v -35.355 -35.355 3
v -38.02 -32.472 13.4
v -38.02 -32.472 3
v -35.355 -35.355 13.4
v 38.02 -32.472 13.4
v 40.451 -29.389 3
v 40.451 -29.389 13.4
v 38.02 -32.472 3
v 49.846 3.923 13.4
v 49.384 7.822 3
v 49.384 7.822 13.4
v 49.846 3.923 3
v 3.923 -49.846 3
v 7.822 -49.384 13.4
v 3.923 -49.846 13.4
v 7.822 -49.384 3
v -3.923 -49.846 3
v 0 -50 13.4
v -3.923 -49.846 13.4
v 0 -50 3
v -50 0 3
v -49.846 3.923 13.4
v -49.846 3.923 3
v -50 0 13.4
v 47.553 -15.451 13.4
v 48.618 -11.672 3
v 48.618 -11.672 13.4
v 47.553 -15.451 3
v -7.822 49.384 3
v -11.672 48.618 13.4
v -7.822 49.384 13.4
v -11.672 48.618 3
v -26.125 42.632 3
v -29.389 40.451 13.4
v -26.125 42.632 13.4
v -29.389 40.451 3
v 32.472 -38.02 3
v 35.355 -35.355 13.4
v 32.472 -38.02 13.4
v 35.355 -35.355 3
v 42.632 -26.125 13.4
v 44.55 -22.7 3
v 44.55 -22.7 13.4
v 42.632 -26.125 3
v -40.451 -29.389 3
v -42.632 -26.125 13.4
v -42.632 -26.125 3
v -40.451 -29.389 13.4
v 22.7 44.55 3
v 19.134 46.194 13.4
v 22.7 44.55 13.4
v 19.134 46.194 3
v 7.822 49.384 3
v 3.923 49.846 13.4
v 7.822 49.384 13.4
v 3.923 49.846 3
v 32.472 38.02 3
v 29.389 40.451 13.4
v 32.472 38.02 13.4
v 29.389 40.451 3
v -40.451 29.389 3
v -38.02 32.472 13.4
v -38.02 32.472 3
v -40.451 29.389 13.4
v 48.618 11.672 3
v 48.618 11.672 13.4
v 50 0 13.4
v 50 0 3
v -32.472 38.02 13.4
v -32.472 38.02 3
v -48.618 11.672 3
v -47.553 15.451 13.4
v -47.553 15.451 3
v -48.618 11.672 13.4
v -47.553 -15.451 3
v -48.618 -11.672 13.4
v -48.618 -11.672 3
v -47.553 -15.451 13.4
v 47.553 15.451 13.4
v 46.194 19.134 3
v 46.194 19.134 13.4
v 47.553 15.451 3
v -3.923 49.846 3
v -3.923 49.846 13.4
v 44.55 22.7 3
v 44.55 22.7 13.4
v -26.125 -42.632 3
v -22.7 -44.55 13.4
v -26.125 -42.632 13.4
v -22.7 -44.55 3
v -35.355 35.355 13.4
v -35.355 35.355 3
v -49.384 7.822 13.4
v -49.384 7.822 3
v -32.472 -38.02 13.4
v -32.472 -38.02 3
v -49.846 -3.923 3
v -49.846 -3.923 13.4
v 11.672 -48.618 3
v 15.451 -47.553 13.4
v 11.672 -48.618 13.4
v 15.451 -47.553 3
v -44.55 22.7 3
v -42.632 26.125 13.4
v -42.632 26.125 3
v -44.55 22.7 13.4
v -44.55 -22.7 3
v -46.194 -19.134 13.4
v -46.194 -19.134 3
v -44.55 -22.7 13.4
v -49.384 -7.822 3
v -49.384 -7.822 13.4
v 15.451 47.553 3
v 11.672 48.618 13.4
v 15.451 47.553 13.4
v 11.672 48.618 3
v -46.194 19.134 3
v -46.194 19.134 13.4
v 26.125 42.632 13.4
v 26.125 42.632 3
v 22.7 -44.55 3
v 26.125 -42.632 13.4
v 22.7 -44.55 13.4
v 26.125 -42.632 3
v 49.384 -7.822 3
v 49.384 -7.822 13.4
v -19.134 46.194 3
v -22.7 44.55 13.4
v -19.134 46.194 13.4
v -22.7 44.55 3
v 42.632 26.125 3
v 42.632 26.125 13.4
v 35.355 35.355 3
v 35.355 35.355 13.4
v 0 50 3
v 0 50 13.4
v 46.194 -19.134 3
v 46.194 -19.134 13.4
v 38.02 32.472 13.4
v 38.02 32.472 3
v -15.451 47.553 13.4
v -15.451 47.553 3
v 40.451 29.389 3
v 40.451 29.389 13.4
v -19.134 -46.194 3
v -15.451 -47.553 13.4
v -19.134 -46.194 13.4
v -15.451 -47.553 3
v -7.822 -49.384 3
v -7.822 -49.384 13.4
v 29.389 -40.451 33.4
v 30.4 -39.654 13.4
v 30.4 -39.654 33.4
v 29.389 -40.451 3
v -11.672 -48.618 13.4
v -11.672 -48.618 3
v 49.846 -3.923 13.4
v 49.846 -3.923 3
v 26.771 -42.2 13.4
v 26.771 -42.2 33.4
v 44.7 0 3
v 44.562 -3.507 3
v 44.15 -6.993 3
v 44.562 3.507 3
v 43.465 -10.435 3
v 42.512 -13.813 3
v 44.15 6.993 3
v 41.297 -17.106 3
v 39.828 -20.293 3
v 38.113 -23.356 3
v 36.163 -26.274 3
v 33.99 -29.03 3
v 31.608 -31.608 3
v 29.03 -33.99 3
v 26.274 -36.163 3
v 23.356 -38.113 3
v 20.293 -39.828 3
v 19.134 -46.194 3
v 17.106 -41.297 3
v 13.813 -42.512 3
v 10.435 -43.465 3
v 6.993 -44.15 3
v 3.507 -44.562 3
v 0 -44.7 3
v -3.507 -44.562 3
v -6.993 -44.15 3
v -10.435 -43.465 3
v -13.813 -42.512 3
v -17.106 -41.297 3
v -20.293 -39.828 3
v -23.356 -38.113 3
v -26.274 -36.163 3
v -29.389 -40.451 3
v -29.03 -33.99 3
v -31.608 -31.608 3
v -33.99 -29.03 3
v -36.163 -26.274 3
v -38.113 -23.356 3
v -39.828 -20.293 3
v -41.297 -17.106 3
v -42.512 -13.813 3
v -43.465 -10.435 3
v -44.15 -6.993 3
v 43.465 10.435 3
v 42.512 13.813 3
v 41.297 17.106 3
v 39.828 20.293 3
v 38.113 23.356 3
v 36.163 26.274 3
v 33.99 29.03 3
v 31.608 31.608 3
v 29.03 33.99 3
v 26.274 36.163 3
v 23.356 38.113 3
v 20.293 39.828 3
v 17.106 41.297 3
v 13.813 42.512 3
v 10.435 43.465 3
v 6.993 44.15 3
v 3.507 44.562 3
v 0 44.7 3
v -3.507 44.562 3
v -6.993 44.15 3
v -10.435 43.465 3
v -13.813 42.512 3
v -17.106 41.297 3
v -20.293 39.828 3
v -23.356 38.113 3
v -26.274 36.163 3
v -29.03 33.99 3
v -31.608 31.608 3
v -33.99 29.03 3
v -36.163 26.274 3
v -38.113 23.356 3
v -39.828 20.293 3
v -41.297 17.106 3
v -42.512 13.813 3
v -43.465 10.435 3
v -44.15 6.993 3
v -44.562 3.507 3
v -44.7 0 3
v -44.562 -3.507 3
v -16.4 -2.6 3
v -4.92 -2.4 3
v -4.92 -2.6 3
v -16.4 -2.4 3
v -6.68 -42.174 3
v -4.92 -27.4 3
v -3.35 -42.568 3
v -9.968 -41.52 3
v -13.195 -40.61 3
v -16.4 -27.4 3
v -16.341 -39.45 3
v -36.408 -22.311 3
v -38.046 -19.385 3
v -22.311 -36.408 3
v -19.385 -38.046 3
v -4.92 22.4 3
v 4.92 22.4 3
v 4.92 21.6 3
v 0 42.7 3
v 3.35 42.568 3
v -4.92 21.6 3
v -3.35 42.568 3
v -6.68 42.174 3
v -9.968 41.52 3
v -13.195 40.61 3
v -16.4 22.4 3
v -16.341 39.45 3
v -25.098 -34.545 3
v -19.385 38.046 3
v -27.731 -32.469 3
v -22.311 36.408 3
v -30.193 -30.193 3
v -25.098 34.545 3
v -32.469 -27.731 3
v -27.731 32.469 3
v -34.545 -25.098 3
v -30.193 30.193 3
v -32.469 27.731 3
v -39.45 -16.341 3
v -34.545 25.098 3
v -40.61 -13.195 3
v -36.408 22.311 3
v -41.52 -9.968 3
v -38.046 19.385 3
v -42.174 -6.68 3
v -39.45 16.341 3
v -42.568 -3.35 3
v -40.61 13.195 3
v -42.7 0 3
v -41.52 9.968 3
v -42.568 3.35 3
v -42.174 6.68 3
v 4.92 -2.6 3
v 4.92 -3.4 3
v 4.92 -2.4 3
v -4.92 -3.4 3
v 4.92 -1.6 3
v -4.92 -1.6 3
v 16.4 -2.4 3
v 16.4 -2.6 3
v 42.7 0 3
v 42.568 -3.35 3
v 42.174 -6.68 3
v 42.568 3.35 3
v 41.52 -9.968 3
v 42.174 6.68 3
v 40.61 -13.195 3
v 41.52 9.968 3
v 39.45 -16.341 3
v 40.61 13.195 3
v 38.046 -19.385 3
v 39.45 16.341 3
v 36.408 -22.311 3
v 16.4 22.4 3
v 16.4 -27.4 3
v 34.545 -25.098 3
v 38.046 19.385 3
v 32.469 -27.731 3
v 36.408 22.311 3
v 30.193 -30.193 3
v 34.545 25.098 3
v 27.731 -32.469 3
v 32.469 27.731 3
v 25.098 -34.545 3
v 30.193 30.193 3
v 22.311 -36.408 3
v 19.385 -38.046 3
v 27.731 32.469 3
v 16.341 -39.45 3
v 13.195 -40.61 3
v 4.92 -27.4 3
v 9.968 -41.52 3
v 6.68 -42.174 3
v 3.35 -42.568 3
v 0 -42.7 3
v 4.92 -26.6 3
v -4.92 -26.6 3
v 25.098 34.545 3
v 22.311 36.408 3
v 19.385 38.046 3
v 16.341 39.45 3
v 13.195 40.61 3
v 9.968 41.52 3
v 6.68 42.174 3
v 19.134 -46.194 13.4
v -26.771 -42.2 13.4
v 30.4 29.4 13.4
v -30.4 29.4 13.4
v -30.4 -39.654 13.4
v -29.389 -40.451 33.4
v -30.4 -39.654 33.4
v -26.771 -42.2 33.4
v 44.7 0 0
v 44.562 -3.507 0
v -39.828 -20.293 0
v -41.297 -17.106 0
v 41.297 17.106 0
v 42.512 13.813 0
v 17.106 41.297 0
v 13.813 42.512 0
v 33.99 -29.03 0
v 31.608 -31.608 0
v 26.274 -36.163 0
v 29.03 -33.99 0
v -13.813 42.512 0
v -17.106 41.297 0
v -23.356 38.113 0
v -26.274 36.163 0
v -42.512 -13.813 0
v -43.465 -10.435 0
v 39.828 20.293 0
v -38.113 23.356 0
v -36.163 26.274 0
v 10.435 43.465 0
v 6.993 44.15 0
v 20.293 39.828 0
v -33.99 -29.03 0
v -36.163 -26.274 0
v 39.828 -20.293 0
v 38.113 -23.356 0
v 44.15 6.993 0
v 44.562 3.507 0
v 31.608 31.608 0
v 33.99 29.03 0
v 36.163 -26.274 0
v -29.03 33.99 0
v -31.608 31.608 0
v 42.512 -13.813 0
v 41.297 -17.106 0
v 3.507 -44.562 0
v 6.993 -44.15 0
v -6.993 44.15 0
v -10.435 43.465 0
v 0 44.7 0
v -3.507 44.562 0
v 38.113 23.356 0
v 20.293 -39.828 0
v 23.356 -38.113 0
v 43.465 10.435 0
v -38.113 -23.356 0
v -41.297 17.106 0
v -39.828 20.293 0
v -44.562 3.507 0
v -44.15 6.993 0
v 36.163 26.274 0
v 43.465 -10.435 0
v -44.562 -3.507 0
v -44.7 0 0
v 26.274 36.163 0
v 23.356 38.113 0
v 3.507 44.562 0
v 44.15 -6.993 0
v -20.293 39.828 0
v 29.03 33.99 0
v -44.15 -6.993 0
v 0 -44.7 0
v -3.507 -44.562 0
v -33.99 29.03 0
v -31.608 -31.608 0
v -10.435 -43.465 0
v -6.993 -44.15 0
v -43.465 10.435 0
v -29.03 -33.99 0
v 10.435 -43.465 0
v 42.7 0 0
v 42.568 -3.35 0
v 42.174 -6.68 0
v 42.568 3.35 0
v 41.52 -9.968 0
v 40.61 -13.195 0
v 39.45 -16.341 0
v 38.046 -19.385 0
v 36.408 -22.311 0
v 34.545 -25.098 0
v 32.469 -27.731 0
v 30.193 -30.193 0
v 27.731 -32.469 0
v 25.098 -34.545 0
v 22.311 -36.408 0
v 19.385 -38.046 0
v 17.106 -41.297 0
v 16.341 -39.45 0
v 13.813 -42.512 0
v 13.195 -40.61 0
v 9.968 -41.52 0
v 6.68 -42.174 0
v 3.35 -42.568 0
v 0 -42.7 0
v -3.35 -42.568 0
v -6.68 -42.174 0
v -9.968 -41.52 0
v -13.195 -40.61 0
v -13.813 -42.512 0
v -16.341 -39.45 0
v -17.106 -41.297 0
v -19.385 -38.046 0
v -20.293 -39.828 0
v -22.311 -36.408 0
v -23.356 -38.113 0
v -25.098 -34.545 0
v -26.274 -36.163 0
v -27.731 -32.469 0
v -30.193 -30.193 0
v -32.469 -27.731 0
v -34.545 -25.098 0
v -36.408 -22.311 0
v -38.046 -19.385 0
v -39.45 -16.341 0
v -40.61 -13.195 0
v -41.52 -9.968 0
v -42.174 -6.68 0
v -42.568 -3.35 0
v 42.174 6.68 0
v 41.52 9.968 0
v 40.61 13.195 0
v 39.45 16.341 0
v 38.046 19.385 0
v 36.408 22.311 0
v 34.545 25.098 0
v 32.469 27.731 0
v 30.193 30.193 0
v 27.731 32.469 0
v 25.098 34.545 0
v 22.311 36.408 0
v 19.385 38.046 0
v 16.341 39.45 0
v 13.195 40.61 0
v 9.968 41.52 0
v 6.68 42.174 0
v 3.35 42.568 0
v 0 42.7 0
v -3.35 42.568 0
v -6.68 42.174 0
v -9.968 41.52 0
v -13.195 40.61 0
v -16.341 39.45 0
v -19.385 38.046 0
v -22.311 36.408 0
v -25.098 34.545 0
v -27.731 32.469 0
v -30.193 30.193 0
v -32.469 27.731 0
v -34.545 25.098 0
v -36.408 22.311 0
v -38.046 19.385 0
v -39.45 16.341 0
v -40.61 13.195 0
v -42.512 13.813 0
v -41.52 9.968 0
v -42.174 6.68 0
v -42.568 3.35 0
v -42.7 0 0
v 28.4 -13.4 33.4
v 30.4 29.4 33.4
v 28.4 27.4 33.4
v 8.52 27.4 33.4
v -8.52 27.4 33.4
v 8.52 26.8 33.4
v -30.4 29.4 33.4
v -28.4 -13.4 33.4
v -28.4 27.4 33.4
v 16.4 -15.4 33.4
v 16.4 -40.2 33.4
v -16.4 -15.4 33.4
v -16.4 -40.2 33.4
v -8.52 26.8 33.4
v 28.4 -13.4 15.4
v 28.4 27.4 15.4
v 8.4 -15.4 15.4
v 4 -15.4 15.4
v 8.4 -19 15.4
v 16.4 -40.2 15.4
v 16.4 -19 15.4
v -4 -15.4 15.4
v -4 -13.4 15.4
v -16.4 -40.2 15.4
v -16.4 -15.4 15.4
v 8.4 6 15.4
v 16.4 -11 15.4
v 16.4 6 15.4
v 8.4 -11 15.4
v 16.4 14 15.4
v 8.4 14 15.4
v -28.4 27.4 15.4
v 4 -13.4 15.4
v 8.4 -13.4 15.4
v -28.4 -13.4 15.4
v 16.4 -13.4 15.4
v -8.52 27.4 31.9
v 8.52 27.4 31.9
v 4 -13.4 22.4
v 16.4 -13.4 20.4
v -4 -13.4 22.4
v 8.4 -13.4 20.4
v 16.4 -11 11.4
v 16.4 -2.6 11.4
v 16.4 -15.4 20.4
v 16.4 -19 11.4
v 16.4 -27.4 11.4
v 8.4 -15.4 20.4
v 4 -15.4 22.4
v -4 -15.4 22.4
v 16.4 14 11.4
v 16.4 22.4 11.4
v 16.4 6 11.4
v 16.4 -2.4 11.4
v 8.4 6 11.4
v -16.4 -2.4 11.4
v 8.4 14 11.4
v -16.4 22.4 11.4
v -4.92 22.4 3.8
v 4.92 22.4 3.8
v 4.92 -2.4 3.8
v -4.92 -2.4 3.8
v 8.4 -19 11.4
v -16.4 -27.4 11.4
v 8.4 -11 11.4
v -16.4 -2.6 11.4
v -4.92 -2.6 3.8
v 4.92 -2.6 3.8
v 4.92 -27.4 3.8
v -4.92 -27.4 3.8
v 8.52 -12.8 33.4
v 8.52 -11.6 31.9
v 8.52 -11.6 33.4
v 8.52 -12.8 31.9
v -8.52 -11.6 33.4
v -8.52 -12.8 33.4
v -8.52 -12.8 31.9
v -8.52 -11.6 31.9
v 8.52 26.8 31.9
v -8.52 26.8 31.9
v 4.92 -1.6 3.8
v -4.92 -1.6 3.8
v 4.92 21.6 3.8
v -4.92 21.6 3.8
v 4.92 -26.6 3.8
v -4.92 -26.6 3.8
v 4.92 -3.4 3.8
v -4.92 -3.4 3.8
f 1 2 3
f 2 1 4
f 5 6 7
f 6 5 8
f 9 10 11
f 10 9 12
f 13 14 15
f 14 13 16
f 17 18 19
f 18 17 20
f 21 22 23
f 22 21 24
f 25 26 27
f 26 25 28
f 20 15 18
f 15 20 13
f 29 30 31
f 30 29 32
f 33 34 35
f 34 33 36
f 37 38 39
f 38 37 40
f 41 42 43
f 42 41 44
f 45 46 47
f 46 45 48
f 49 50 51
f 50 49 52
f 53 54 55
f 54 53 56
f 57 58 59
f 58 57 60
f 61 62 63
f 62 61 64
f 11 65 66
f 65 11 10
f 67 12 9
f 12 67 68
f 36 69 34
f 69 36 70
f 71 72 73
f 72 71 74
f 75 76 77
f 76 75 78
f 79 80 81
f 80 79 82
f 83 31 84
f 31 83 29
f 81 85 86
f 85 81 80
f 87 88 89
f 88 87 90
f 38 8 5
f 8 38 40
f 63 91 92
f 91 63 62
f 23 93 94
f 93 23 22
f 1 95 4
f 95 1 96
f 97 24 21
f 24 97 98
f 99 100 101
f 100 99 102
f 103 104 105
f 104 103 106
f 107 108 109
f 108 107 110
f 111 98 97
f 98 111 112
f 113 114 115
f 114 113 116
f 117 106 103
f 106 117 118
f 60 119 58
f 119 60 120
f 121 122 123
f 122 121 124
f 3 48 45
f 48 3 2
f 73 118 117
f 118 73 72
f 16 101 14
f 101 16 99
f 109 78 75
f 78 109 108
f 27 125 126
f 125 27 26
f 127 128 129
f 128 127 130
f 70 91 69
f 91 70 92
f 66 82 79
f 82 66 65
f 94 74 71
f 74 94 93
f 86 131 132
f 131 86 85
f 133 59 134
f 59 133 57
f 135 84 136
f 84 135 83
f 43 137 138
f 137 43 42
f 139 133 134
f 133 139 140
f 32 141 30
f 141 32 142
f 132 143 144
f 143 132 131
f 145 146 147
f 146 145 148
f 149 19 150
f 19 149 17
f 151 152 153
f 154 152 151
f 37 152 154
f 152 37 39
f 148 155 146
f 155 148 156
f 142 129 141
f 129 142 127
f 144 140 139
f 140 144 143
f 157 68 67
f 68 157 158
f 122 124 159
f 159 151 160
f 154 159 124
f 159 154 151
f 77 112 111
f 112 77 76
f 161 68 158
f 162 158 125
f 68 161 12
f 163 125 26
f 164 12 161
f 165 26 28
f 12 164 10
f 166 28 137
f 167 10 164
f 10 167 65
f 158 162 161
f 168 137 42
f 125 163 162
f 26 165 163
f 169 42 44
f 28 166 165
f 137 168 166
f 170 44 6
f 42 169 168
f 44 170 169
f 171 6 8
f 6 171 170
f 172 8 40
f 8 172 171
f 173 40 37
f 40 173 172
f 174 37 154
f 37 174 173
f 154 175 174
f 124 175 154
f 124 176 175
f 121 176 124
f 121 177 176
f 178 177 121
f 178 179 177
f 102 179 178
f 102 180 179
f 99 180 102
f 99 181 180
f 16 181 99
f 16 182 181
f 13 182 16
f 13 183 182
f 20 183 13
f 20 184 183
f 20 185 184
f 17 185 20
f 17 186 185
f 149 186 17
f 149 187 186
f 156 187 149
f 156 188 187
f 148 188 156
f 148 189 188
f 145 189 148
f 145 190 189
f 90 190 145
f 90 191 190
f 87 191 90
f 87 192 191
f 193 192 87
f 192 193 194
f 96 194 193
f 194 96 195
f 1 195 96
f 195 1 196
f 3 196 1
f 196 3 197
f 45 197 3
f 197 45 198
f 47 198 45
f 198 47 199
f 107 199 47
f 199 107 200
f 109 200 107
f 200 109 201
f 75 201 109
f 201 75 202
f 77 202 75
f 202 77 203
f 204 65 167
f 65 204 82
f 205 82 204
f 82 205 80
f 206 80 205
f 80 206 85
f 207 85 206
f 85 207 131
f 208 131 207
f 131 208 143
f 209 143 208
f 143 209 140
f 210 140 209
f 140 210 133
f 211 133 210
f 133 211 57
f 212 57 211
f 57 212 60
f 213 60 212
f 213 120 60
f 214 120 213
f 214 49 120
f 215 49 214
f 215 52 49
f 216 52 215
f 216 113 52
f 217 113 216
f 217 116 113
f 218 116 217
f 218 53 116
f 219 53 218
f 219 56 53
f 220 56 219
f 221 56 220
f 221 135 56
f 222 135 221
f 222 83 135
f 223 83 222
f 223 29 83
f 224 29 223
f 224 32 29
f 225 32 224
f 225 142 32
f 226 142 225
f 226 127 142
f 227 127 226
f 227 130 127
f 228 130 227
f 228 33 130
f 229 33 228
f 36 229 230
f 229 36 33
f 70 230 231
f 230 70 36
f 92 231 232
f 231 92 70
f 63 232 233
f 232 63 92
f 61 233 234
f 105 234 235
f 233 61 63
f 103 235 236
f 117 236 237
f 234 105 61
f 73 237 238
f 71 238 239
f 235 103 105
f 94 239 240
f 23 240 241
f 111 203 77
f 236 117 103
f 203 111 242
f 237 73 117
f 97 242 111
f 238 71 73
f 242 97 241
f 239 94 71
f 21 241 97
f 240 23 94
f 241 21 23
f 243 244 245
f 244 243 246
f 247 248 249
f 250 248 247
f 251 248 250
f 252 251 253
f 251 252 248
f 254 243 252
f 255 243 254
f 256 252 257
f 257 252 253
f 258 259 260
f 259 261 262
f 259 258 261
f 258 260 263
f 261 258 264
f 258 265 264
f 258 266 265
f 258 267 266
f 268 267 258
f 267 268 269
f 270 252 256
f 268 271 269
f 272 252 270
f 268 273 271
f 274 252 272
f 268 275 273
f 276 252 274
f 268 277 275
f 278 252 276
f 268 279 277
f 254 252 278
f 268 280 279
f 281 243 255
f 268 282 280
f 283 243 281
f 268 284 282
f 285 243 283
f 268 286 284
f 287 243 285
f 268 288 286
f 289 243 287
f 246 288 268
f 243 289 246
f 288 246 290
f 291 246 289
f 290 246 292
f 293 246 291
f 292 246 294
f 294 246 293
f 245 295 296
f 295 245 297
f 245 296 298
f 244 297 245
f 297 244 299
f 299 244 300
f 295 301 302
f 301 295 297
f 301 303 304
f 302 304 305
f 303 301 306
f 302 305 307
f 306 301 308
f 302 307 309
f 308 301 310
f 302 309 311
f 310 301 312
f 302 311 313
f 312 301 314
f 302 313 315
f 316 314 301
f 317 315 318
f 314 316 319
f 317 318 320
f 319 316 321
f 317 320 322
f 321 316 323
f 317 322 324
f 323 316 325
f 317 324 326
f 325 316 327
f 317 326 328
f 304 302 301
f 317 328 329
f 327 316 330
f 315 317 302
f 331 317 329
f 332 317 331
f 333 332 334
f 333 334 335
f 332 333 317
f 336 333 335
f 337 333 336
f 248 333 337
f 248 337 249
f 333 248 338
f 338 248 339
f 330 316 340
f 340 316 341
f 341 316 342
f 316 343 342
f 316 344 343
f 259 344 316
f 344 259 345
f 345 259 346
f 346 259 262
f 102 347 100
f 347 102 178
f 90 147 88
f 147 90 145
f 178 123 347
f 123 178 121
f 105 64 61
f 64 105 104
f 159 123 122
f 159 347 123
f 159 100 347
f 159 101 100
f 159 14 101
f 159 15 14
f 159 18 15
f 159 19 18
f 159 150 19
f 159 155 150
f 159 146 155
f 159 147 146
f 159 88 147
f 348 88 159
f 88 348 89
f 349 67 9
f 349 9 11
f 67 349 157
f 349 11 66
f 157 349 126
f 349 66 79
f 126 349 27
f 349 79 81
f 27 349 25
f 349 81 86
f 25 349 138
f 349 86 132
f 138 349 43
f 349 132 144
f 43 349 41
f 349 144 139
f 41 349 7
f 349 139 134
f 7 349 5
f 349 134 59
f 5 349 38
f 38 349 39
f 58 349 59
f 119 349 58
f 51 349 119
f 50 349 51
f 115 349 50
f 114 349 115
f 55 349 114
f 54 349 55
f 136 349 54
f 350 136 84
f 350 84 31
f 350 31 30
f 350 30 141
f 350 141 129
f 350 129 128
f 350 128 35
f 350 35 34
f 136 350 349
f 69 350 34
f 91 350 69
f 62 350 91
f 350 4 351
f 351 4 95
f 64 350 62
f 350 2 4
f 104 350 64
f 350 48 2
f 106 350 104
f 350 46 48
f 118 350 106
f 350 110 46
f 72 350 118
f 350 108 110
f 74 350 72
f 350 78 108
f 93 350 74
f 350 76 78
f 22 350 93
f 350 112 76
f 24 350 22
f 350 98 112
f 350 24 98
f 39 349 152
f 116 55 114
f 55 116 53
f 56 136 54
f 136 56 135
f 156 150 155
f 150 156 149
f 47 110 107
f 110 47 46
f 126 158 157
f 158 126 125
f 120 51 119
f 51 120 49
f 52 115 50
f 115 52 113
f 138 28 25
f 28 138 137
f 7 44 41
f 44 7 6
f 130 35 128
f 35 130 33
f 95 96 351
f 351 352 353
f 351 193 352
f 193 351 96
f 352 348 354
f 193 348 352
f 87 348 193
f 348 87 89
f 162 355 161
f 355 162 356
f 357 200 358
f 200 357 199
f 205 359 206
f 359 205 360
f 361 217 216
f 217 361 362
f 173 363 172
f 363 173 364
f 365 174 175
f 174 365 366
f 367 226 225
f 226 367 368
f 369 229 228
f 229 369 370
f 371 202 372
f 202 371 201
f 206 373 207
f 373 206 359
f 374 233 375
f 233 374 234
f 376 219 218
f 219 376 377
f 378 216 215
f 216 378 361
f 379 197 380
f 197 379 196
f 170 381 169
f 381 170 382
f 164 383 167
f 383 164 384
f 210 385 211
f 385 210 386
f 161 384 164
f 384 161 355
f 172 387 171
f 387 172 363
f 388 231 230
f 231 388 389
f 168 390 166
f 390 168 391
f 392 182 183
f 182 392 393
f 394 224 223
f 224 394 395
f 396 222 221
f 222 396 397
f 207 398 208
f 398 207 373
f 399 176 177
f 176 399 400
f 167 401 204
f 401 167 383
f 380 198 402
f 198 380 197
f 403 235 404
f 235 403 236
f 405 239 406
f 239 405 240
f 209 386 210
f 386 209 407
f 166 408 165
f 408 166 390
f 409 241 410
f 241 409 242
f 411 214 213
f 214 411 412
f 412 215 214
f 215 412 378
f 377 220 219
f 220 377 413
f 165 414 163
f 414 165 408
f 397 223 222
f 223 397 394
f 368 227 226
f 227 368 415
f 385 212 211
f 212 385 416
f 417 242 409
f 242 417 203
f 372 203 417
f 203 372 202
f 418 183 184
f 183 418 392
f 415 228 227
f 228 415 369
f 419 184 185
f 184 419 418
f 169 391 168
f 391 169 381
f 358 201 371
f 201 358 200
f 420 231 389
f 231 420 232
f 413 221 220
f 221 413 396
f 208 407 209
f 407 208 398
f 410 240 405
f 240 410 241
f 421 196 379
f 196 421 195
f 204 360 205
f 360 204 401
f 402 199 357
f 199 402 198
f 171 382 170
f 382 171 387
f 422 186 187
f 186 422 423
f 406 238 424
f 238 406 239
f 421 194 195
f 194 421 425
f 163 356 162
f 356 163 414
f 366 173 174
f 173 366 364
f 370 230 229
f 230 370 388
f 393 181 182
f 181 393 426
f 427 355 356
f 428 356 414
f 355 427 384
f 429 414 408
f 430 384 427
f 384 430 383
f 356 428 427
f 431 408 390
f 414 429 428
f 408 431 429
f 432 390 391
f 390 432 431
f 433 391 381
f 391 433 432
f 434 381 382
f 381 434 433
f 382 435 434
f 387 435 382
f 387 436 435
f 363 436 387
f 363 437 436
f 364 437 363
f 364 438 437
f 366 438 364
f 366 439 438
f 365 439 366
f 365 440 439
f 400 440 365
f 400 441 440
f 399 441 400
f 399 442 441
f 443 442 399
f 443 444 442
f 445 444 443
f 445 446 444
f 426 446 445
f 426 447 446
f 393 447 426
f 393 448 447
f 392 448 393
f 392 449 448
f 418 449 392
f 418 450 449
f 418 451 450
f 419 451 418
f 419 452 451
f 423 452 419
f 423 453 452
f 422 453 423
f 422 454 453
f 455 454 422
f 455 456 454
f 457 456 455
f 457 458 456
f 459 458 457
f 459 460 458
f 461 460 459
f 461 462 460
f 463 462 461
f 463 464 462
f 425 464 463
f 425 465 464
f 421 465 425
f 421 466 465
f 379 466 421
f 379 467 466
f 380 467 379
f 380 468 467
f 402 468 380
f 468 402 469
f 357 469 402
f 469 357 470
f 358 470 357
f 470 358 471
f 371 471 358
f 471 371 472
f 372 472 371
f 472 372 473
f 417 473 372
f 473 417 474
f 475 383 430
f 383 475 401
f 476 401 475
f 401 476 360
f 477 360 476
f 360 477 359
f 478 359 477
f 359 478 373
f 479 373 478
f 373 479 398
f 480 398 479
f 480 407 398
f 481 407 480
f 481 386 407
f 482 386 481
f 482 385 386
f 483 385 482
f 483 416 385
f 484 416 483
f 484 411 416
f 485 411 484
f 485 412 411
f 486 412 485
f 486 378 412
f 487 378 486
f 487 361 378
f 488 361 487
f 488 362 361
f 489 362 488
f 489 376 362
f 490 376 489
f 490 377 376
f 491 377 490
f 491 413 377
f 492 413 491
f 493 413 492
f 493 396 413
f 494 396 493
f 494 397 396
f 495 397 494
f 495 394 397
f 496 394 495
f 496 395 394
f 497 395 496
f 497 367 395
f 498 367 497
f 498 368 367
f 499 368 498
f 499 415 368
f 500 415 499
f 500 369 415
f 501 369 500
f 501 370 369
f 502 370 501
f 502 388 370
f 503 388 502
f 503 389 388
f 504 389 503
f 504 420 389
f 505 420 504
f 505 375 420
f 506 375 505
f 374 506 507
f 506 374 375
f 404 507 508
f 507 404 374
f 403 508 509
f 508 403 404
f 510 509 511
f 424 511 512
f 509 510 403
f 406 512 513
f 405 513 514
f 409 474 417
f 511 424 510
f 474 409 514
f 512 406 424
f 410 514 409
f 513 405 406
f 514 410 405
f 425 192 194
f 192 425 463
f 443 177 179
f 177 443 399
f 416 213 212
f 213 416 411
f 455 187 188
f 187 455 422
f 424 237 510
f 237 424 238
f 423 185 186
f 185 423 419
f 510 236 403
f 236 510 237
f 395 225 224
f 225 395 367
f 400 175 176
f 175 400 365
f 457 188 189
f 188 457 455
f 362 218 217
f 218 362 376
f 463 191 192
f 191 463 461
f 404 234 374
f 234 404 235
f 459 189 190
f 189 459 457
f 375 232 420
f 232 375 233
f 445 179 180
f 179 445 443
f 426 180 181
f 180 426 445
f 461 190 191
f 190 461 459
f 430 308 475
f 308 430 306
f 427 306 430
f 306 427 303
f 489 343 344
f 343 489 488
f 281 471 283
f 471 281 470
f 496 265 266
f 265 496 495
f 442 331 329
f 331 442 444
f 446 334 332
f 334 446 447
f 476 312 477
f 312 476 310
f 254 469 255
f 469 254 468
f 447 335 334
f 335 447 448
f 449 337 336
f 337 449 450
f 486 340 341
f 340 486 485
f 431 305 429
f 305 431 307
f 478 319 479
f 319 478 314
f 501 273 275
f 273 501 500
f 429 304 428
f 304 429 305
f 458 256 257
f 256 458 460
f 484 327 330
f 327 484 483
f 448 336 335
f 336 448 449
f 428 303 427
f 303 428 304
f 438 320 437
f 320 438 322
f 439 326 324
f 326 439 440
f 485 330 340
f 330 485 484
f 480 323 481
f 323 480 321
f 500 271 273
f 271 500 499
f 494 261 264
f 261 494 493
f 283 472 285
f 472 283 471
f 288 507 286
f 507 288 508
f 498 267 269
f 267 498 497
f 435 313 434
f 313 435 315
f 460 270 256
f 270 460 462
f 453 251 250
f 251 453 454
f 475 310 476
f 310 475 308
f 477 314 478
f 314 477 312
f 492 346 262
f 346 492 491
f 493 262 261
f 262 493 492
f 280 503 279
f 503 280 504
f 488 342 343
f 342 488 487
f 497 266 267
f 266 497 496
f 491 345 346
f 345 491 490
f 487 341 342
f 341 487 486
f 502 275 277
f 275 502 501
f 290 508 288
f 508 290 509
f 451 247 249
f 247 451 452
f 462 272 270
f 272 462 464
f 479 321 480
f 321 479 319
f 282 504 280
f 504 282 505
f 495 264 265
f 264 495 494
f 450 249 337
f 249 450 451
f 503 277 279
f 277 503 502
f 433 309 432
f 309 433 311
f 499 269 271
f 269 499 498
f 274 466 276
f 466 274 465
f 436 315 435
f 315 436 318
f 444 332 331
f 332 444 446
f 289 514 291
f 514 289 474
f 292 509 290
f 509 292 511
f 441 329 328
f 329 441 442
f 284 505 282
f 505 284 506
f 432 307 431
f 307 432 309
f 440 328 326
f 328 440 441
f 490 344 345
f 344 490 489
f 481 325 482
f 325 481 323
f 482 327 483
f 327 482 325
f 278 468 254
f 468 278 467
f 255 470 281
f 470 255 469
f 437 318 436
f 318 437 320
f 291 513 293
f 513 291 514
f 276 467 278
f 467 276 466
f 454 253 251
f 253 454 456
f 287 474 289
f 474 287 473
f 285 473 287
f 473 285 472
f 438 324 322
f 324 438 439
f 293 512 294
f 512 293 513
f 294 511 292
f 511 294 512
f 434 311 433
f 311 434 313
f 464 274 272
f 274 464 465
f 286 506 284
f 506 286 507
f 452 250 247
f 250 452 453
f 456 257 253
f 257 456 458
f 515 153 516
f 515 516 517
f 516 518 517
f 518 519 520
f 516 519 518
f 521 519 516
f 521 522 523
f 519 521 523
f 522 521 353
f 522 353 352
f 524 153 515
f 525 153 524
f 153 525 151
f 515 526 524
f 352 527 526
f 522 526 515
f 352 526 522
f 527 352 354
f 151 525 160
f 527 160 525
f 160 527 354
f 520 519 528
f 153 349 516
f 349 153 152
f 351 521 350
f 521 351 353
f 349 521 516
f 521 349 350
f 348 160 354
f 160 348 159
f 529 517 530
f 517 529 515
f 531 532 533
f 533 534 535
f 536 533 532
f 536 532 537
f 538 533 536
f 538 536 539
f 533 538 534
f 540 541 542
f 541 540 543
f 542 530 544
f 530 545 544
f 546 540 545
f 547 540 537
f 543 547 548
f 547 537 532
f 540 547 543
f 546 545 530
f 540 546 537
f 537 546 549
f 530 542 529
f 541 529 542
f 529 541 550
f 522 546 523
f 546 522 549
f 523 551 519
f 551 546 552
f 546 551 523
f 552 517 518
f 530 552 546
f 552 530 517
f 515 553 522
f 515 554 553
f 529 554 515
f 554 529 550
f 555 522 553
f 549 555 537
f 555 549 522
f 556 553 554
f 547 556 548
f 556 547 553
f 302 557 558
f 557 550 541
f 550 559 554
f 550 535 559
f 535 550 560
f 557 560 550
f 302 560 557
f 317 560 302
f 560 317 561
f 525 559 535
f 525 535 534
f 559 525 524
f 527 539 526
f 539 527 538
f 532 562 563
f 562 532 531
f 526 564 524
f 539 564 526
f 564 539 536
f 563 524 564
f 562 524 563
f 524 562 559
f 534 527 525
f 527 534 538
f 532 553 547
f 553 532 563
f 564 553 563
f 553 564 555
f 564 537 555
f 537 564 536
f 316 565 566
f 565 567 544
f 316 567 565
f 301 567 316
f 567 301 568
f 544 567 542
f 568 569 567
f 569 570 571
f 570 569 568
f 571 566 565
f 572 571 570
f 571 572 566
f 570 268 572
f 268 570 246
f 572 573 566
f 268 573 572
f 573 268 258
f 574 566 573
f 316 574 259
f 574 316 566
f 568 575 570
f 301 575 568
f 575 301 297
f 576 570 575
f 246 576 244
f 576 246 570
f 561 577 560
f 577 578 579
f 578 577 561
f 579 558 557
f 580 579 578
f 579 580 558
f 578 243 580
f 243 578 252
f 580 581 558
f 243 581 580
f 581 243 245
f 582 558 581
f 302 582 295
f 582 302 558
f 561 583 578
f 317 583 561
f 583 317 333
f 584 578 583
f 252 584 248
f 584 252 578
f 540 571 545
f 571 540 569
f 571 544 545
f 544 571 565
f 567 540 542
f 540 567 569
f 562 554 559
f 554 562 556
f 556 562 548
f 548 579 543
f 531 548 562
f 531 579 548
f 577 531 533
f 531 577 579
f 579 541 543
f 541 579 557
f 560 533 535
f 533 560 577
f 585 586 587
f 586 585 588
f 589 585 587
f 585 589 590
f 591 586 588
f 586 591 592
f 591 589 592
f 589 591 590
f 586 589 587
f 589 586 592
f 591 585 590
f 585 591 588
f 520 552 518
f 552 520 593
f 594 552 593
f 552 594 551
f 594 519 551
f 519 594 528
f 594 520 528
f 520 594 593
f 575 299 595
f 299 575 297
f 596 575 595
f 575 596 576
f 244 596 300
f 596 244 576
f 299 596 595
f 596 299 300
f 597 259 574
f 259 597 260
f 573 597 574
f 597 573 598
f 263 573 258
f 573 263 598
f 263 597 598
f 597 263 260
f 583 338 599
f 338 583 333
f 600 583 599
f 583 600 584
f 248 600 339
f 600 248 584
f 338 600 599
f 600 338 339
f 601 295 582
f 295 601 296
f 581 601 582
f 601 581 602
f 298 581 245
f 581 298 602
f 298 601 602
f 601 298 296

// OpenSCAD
// Smart Sourdough Lid for Weck 580ml (742) Jar
// Single monolithic piece — no screws, no protruding parts
// Sensors recessed flush into the flat bottom surface
//
// Print: PETG, 0.2mm layers, 20% infill
// Orient: print UPSIDE DOWN (flat bottom = print bed)

// ─── JAR PARAMETERS ────────────────────────────────────────
lid_od        = 100;   // Weck glass lid outer diameter
jar_id        = 90;    // jar mouth inner diameter
clip_ledge    = 3;     // radial width the metal clips grip
lid_rim_h     = 4;     // rim height for Weck clips
centering_h   = 3;     // skirt depth below base (fits inside jar, seats on gasket)

// ─── M5STACK CORE INK ──────────────────────────────────────
core_l  = 56;          // X
core_w  = 40;          // Y
core_h  = 16;          // Z (display up)

// ─── M5STACK UNITS ─────────────────────────────────────────
unit_l  = 32;
unit_w  = 24;
tof_h   = 8;
env_h   = 8;
hub_h   = 11;

// ─── DESIGN PARAMETERS ────────────────────────────────────
wall_t      = 2;       // wall thickness
cl          = 0.4;     // clearance per side
tof_bore    = 10;      // ToF beam window diameter
cable_ch_w  = 8;       // cable channel width
cable_ch_d  = 5;       // cable channel depth
lip         = 1.2;     // retaining lip inset
lip_h       = 1.5;     // retaining lip height
snap_t      = 0.8;     // snap tab thickness
$fn         = 80;


// ─── DERIVED ───────────────────────────────────────────────
lid_r  = lid_od / 2;
jar_ir = jar_id / 2;

// Pocket dimensions (with clearance)
cpL = core_l + 2*cl;   cpW = core_w + 2*cl;
hpL = unit_l + 2*cl;   hpW = unit_w + 2*cl;
tpL = unit_l + 2*cl;   tpW = unit_w + 2*cl;
epL = unit_l + 2*cl;   epW = unit_w + 2*cl;

// Base plate thickness: enough to fully recess the sensors
sensor_depth = max(tof_h, env_h) + cl;
base_t = sensor_depth + wall_t;

// Top-side component positions
core_cy = (cpW/2 + wall_t) - (cpW + hpW + 3*wall_t)/2 + cpW/2;
hub_cy  = core_cy - cpW/2 - wall_t - hpW/2;

// Bottom-side sensor positions (flush in base plate)
tof_cx = 0;     tof_cy = 10;
env_cx = 0;     env_cy = -15;

// Top housing height above base plate
top_h = wall_t + core_h + lip_h + 0.5;

// Housing footprint
fp_top   = core_cy + cpW/2 + wall_t;
fp_bot   = hub_cy  - hpW/2 - wall_t;
fp_left  = -(cpL/2 + wall_t);
fp_right =  (cpL/2 + wall_t);

// ═══════════════════════════════════════════════════════════
//  RENDER SELECTOR
// ═══════════════════════════════════════════════════════════
//assembled();
print_orientation();

module print_orientation() {
    // Right-side up: skirt on bed, walls print upward
    // Sensor pocket roofs bridge over ~32x24mm (easy at 0.2mm layers)
    translate([0, 0, centering_h])
        sourdough_lid();
}

module assembled() {
    color("SteelBlue", 0.8) sourdough_lid();

    // Ghost components
    %translate([0, core_cy, base_t + wall_t + core_h/2])
        cube([core_l, core_w, core_h], center=true);
    %translate([0, hub_cy, base_t + wall_t + hub_h/2])
        cube([unit_l, unit_w, hub_h], center=true);
    %translate([tof_cx, tof_cy, sensor_depth/2 - cl/2])
        cube([unit_l, unit_w, tof_h], center=true);
    %translate([env_cx, env_cy, sensor_depth/2 - cl/2])
        cube([unit_l, unit_w, env_h], center=true);
}

// ═══════════════════════════════════════════════════════════
//  MAIN MODEL
// ═══════════════════════════════════════════════════════════
module sourdough_lid() {
    difference() {
        union() {
            // ── Thick base disc (sensors recess into this) ──
            cylinder(h=base_t, r=lid_r);

            // ── Rim for Weck clip grip ──
            difference() {
                cylinder(h=max(base_t, lid_rim_h), r=lid_r);
                translate([0, 0, -0.1])
                    cylinder(h=max(base_t, lid_rim_h) + 0.2,
                             r=lid_r - clip_ledge);
            }

            // ── Centering skirt (fits inside jar mouth, seats on rubber gasket) ──
            translate([0, 0, -centering_h])
                difference() {
                    cylinder(h=centering_h, r=jar_ir - 0.3);
                    translate([0, 0, -0.1])
                        cylinder(h=centering_h + 0.2, r=jar_ir - 0.3 - wall_t);
                }

            // ── Top housing walls ──
            intersection() {
                cylinder(h=base_t + top_h, r=lid_r);
                translate([0, (fp_top+fp_bot)/2, (base_t + top_h)/2])
                    cube([fp_right - fp_left,
                          fp_top - fp_bot,
                          base_t + top_h], center=true);
            }
        }

        // ══════════ TOP POCKETS (from above) ══════════

        // Core Ink pocket
        translate([-cpL/2, core_cy - cpW/2, base_t + wall_t])
            cube([cpL, cpW, top_h]);

        // HUB pocket
        translate([-hpL/2, hub_cy - hpW/2, base_t + wall_t])
            cube([hpL, hpW, top_h]);

        // Cable channel between Core Ink and HUB
        translate([-cable_ch_w/2, hub_cy + hpW/2 - 0.1, base_t + wall_t])
            cube([cable_ch_w, wall_t + 0.2, cable_ch_d + wall_t]);

        // ══════════ BOTTOM POCKETS (from below, flush) ══════════

        // ToF sensor pocket
        translate([tof_cx - tpL/2, tof_cy - tpW/2, -0.1])
            cube([tpL, tpW, sensor_depth + 0.1]);

        // ToF beam hole through remaining wall into jar
        // (not needed — sensor face is flush with bottom)
        // But we need the bore through the wall_t above the sensor
        // so it can see through to the top cable area
        // Actually: ToF looks DOWN, and it IS at the bottom. No extra hole needed.

        // ENV III sensor pocket
        translate([env_cx - epL/2, env_cy - epW/2, -0.1])
            cube([epL, epW, sensor_depth + 0.1]);

        // ══════════ CABLE ROUTING (bottom to top) ══════════

        // Vertical cable channel from ToF pocket to top surface
        translate([tof_cx + tpL/2 - cable_ch_w, tof_cy - cable_ch_w/2, -0.1])
            cube([cable_ch_w, cable_ch_w, base_t + wall_t + cable_ch_d + 0.1]);

        // Vertical cable channel from ENV III pocket to top surface
        translate([env_cx + epL/2 - cable_ch_w, env_cy - cable_ch_w/2, -0.1])
            cube([cable_ch_w, cable_ch_w, base_t + wall_t + cable_ch_d + 0.1]);
    }

    // ── Retaining lips for Core Ink ──
    for (ym = [-1, 1])
        translate([-cpL*0.15,
                   core_cy + ym*(cpW/2 - lip/2),
                   base_t + top_h - lip_h])
            cube([cpL*0.3, lip, lip_h]);

    // ── Snap tabs to hold sensors from below ──
    // ToF
    for (ym = [-1, 1])
        translate([tof_cx, tof_cy + ym*(tpW/2 - snap_t/2), snap_t/2])
            cube([tpL*0.3, snap_t, snap_t], center=true);
    // ENV III
    for (ym = [-1, 1])
        translate([env_cx, env_cy + ym*(epW/2 - snap_t/2), snap_t/2])
            cube([epL*0.3, snap_t, snap_t], center=true);
}
